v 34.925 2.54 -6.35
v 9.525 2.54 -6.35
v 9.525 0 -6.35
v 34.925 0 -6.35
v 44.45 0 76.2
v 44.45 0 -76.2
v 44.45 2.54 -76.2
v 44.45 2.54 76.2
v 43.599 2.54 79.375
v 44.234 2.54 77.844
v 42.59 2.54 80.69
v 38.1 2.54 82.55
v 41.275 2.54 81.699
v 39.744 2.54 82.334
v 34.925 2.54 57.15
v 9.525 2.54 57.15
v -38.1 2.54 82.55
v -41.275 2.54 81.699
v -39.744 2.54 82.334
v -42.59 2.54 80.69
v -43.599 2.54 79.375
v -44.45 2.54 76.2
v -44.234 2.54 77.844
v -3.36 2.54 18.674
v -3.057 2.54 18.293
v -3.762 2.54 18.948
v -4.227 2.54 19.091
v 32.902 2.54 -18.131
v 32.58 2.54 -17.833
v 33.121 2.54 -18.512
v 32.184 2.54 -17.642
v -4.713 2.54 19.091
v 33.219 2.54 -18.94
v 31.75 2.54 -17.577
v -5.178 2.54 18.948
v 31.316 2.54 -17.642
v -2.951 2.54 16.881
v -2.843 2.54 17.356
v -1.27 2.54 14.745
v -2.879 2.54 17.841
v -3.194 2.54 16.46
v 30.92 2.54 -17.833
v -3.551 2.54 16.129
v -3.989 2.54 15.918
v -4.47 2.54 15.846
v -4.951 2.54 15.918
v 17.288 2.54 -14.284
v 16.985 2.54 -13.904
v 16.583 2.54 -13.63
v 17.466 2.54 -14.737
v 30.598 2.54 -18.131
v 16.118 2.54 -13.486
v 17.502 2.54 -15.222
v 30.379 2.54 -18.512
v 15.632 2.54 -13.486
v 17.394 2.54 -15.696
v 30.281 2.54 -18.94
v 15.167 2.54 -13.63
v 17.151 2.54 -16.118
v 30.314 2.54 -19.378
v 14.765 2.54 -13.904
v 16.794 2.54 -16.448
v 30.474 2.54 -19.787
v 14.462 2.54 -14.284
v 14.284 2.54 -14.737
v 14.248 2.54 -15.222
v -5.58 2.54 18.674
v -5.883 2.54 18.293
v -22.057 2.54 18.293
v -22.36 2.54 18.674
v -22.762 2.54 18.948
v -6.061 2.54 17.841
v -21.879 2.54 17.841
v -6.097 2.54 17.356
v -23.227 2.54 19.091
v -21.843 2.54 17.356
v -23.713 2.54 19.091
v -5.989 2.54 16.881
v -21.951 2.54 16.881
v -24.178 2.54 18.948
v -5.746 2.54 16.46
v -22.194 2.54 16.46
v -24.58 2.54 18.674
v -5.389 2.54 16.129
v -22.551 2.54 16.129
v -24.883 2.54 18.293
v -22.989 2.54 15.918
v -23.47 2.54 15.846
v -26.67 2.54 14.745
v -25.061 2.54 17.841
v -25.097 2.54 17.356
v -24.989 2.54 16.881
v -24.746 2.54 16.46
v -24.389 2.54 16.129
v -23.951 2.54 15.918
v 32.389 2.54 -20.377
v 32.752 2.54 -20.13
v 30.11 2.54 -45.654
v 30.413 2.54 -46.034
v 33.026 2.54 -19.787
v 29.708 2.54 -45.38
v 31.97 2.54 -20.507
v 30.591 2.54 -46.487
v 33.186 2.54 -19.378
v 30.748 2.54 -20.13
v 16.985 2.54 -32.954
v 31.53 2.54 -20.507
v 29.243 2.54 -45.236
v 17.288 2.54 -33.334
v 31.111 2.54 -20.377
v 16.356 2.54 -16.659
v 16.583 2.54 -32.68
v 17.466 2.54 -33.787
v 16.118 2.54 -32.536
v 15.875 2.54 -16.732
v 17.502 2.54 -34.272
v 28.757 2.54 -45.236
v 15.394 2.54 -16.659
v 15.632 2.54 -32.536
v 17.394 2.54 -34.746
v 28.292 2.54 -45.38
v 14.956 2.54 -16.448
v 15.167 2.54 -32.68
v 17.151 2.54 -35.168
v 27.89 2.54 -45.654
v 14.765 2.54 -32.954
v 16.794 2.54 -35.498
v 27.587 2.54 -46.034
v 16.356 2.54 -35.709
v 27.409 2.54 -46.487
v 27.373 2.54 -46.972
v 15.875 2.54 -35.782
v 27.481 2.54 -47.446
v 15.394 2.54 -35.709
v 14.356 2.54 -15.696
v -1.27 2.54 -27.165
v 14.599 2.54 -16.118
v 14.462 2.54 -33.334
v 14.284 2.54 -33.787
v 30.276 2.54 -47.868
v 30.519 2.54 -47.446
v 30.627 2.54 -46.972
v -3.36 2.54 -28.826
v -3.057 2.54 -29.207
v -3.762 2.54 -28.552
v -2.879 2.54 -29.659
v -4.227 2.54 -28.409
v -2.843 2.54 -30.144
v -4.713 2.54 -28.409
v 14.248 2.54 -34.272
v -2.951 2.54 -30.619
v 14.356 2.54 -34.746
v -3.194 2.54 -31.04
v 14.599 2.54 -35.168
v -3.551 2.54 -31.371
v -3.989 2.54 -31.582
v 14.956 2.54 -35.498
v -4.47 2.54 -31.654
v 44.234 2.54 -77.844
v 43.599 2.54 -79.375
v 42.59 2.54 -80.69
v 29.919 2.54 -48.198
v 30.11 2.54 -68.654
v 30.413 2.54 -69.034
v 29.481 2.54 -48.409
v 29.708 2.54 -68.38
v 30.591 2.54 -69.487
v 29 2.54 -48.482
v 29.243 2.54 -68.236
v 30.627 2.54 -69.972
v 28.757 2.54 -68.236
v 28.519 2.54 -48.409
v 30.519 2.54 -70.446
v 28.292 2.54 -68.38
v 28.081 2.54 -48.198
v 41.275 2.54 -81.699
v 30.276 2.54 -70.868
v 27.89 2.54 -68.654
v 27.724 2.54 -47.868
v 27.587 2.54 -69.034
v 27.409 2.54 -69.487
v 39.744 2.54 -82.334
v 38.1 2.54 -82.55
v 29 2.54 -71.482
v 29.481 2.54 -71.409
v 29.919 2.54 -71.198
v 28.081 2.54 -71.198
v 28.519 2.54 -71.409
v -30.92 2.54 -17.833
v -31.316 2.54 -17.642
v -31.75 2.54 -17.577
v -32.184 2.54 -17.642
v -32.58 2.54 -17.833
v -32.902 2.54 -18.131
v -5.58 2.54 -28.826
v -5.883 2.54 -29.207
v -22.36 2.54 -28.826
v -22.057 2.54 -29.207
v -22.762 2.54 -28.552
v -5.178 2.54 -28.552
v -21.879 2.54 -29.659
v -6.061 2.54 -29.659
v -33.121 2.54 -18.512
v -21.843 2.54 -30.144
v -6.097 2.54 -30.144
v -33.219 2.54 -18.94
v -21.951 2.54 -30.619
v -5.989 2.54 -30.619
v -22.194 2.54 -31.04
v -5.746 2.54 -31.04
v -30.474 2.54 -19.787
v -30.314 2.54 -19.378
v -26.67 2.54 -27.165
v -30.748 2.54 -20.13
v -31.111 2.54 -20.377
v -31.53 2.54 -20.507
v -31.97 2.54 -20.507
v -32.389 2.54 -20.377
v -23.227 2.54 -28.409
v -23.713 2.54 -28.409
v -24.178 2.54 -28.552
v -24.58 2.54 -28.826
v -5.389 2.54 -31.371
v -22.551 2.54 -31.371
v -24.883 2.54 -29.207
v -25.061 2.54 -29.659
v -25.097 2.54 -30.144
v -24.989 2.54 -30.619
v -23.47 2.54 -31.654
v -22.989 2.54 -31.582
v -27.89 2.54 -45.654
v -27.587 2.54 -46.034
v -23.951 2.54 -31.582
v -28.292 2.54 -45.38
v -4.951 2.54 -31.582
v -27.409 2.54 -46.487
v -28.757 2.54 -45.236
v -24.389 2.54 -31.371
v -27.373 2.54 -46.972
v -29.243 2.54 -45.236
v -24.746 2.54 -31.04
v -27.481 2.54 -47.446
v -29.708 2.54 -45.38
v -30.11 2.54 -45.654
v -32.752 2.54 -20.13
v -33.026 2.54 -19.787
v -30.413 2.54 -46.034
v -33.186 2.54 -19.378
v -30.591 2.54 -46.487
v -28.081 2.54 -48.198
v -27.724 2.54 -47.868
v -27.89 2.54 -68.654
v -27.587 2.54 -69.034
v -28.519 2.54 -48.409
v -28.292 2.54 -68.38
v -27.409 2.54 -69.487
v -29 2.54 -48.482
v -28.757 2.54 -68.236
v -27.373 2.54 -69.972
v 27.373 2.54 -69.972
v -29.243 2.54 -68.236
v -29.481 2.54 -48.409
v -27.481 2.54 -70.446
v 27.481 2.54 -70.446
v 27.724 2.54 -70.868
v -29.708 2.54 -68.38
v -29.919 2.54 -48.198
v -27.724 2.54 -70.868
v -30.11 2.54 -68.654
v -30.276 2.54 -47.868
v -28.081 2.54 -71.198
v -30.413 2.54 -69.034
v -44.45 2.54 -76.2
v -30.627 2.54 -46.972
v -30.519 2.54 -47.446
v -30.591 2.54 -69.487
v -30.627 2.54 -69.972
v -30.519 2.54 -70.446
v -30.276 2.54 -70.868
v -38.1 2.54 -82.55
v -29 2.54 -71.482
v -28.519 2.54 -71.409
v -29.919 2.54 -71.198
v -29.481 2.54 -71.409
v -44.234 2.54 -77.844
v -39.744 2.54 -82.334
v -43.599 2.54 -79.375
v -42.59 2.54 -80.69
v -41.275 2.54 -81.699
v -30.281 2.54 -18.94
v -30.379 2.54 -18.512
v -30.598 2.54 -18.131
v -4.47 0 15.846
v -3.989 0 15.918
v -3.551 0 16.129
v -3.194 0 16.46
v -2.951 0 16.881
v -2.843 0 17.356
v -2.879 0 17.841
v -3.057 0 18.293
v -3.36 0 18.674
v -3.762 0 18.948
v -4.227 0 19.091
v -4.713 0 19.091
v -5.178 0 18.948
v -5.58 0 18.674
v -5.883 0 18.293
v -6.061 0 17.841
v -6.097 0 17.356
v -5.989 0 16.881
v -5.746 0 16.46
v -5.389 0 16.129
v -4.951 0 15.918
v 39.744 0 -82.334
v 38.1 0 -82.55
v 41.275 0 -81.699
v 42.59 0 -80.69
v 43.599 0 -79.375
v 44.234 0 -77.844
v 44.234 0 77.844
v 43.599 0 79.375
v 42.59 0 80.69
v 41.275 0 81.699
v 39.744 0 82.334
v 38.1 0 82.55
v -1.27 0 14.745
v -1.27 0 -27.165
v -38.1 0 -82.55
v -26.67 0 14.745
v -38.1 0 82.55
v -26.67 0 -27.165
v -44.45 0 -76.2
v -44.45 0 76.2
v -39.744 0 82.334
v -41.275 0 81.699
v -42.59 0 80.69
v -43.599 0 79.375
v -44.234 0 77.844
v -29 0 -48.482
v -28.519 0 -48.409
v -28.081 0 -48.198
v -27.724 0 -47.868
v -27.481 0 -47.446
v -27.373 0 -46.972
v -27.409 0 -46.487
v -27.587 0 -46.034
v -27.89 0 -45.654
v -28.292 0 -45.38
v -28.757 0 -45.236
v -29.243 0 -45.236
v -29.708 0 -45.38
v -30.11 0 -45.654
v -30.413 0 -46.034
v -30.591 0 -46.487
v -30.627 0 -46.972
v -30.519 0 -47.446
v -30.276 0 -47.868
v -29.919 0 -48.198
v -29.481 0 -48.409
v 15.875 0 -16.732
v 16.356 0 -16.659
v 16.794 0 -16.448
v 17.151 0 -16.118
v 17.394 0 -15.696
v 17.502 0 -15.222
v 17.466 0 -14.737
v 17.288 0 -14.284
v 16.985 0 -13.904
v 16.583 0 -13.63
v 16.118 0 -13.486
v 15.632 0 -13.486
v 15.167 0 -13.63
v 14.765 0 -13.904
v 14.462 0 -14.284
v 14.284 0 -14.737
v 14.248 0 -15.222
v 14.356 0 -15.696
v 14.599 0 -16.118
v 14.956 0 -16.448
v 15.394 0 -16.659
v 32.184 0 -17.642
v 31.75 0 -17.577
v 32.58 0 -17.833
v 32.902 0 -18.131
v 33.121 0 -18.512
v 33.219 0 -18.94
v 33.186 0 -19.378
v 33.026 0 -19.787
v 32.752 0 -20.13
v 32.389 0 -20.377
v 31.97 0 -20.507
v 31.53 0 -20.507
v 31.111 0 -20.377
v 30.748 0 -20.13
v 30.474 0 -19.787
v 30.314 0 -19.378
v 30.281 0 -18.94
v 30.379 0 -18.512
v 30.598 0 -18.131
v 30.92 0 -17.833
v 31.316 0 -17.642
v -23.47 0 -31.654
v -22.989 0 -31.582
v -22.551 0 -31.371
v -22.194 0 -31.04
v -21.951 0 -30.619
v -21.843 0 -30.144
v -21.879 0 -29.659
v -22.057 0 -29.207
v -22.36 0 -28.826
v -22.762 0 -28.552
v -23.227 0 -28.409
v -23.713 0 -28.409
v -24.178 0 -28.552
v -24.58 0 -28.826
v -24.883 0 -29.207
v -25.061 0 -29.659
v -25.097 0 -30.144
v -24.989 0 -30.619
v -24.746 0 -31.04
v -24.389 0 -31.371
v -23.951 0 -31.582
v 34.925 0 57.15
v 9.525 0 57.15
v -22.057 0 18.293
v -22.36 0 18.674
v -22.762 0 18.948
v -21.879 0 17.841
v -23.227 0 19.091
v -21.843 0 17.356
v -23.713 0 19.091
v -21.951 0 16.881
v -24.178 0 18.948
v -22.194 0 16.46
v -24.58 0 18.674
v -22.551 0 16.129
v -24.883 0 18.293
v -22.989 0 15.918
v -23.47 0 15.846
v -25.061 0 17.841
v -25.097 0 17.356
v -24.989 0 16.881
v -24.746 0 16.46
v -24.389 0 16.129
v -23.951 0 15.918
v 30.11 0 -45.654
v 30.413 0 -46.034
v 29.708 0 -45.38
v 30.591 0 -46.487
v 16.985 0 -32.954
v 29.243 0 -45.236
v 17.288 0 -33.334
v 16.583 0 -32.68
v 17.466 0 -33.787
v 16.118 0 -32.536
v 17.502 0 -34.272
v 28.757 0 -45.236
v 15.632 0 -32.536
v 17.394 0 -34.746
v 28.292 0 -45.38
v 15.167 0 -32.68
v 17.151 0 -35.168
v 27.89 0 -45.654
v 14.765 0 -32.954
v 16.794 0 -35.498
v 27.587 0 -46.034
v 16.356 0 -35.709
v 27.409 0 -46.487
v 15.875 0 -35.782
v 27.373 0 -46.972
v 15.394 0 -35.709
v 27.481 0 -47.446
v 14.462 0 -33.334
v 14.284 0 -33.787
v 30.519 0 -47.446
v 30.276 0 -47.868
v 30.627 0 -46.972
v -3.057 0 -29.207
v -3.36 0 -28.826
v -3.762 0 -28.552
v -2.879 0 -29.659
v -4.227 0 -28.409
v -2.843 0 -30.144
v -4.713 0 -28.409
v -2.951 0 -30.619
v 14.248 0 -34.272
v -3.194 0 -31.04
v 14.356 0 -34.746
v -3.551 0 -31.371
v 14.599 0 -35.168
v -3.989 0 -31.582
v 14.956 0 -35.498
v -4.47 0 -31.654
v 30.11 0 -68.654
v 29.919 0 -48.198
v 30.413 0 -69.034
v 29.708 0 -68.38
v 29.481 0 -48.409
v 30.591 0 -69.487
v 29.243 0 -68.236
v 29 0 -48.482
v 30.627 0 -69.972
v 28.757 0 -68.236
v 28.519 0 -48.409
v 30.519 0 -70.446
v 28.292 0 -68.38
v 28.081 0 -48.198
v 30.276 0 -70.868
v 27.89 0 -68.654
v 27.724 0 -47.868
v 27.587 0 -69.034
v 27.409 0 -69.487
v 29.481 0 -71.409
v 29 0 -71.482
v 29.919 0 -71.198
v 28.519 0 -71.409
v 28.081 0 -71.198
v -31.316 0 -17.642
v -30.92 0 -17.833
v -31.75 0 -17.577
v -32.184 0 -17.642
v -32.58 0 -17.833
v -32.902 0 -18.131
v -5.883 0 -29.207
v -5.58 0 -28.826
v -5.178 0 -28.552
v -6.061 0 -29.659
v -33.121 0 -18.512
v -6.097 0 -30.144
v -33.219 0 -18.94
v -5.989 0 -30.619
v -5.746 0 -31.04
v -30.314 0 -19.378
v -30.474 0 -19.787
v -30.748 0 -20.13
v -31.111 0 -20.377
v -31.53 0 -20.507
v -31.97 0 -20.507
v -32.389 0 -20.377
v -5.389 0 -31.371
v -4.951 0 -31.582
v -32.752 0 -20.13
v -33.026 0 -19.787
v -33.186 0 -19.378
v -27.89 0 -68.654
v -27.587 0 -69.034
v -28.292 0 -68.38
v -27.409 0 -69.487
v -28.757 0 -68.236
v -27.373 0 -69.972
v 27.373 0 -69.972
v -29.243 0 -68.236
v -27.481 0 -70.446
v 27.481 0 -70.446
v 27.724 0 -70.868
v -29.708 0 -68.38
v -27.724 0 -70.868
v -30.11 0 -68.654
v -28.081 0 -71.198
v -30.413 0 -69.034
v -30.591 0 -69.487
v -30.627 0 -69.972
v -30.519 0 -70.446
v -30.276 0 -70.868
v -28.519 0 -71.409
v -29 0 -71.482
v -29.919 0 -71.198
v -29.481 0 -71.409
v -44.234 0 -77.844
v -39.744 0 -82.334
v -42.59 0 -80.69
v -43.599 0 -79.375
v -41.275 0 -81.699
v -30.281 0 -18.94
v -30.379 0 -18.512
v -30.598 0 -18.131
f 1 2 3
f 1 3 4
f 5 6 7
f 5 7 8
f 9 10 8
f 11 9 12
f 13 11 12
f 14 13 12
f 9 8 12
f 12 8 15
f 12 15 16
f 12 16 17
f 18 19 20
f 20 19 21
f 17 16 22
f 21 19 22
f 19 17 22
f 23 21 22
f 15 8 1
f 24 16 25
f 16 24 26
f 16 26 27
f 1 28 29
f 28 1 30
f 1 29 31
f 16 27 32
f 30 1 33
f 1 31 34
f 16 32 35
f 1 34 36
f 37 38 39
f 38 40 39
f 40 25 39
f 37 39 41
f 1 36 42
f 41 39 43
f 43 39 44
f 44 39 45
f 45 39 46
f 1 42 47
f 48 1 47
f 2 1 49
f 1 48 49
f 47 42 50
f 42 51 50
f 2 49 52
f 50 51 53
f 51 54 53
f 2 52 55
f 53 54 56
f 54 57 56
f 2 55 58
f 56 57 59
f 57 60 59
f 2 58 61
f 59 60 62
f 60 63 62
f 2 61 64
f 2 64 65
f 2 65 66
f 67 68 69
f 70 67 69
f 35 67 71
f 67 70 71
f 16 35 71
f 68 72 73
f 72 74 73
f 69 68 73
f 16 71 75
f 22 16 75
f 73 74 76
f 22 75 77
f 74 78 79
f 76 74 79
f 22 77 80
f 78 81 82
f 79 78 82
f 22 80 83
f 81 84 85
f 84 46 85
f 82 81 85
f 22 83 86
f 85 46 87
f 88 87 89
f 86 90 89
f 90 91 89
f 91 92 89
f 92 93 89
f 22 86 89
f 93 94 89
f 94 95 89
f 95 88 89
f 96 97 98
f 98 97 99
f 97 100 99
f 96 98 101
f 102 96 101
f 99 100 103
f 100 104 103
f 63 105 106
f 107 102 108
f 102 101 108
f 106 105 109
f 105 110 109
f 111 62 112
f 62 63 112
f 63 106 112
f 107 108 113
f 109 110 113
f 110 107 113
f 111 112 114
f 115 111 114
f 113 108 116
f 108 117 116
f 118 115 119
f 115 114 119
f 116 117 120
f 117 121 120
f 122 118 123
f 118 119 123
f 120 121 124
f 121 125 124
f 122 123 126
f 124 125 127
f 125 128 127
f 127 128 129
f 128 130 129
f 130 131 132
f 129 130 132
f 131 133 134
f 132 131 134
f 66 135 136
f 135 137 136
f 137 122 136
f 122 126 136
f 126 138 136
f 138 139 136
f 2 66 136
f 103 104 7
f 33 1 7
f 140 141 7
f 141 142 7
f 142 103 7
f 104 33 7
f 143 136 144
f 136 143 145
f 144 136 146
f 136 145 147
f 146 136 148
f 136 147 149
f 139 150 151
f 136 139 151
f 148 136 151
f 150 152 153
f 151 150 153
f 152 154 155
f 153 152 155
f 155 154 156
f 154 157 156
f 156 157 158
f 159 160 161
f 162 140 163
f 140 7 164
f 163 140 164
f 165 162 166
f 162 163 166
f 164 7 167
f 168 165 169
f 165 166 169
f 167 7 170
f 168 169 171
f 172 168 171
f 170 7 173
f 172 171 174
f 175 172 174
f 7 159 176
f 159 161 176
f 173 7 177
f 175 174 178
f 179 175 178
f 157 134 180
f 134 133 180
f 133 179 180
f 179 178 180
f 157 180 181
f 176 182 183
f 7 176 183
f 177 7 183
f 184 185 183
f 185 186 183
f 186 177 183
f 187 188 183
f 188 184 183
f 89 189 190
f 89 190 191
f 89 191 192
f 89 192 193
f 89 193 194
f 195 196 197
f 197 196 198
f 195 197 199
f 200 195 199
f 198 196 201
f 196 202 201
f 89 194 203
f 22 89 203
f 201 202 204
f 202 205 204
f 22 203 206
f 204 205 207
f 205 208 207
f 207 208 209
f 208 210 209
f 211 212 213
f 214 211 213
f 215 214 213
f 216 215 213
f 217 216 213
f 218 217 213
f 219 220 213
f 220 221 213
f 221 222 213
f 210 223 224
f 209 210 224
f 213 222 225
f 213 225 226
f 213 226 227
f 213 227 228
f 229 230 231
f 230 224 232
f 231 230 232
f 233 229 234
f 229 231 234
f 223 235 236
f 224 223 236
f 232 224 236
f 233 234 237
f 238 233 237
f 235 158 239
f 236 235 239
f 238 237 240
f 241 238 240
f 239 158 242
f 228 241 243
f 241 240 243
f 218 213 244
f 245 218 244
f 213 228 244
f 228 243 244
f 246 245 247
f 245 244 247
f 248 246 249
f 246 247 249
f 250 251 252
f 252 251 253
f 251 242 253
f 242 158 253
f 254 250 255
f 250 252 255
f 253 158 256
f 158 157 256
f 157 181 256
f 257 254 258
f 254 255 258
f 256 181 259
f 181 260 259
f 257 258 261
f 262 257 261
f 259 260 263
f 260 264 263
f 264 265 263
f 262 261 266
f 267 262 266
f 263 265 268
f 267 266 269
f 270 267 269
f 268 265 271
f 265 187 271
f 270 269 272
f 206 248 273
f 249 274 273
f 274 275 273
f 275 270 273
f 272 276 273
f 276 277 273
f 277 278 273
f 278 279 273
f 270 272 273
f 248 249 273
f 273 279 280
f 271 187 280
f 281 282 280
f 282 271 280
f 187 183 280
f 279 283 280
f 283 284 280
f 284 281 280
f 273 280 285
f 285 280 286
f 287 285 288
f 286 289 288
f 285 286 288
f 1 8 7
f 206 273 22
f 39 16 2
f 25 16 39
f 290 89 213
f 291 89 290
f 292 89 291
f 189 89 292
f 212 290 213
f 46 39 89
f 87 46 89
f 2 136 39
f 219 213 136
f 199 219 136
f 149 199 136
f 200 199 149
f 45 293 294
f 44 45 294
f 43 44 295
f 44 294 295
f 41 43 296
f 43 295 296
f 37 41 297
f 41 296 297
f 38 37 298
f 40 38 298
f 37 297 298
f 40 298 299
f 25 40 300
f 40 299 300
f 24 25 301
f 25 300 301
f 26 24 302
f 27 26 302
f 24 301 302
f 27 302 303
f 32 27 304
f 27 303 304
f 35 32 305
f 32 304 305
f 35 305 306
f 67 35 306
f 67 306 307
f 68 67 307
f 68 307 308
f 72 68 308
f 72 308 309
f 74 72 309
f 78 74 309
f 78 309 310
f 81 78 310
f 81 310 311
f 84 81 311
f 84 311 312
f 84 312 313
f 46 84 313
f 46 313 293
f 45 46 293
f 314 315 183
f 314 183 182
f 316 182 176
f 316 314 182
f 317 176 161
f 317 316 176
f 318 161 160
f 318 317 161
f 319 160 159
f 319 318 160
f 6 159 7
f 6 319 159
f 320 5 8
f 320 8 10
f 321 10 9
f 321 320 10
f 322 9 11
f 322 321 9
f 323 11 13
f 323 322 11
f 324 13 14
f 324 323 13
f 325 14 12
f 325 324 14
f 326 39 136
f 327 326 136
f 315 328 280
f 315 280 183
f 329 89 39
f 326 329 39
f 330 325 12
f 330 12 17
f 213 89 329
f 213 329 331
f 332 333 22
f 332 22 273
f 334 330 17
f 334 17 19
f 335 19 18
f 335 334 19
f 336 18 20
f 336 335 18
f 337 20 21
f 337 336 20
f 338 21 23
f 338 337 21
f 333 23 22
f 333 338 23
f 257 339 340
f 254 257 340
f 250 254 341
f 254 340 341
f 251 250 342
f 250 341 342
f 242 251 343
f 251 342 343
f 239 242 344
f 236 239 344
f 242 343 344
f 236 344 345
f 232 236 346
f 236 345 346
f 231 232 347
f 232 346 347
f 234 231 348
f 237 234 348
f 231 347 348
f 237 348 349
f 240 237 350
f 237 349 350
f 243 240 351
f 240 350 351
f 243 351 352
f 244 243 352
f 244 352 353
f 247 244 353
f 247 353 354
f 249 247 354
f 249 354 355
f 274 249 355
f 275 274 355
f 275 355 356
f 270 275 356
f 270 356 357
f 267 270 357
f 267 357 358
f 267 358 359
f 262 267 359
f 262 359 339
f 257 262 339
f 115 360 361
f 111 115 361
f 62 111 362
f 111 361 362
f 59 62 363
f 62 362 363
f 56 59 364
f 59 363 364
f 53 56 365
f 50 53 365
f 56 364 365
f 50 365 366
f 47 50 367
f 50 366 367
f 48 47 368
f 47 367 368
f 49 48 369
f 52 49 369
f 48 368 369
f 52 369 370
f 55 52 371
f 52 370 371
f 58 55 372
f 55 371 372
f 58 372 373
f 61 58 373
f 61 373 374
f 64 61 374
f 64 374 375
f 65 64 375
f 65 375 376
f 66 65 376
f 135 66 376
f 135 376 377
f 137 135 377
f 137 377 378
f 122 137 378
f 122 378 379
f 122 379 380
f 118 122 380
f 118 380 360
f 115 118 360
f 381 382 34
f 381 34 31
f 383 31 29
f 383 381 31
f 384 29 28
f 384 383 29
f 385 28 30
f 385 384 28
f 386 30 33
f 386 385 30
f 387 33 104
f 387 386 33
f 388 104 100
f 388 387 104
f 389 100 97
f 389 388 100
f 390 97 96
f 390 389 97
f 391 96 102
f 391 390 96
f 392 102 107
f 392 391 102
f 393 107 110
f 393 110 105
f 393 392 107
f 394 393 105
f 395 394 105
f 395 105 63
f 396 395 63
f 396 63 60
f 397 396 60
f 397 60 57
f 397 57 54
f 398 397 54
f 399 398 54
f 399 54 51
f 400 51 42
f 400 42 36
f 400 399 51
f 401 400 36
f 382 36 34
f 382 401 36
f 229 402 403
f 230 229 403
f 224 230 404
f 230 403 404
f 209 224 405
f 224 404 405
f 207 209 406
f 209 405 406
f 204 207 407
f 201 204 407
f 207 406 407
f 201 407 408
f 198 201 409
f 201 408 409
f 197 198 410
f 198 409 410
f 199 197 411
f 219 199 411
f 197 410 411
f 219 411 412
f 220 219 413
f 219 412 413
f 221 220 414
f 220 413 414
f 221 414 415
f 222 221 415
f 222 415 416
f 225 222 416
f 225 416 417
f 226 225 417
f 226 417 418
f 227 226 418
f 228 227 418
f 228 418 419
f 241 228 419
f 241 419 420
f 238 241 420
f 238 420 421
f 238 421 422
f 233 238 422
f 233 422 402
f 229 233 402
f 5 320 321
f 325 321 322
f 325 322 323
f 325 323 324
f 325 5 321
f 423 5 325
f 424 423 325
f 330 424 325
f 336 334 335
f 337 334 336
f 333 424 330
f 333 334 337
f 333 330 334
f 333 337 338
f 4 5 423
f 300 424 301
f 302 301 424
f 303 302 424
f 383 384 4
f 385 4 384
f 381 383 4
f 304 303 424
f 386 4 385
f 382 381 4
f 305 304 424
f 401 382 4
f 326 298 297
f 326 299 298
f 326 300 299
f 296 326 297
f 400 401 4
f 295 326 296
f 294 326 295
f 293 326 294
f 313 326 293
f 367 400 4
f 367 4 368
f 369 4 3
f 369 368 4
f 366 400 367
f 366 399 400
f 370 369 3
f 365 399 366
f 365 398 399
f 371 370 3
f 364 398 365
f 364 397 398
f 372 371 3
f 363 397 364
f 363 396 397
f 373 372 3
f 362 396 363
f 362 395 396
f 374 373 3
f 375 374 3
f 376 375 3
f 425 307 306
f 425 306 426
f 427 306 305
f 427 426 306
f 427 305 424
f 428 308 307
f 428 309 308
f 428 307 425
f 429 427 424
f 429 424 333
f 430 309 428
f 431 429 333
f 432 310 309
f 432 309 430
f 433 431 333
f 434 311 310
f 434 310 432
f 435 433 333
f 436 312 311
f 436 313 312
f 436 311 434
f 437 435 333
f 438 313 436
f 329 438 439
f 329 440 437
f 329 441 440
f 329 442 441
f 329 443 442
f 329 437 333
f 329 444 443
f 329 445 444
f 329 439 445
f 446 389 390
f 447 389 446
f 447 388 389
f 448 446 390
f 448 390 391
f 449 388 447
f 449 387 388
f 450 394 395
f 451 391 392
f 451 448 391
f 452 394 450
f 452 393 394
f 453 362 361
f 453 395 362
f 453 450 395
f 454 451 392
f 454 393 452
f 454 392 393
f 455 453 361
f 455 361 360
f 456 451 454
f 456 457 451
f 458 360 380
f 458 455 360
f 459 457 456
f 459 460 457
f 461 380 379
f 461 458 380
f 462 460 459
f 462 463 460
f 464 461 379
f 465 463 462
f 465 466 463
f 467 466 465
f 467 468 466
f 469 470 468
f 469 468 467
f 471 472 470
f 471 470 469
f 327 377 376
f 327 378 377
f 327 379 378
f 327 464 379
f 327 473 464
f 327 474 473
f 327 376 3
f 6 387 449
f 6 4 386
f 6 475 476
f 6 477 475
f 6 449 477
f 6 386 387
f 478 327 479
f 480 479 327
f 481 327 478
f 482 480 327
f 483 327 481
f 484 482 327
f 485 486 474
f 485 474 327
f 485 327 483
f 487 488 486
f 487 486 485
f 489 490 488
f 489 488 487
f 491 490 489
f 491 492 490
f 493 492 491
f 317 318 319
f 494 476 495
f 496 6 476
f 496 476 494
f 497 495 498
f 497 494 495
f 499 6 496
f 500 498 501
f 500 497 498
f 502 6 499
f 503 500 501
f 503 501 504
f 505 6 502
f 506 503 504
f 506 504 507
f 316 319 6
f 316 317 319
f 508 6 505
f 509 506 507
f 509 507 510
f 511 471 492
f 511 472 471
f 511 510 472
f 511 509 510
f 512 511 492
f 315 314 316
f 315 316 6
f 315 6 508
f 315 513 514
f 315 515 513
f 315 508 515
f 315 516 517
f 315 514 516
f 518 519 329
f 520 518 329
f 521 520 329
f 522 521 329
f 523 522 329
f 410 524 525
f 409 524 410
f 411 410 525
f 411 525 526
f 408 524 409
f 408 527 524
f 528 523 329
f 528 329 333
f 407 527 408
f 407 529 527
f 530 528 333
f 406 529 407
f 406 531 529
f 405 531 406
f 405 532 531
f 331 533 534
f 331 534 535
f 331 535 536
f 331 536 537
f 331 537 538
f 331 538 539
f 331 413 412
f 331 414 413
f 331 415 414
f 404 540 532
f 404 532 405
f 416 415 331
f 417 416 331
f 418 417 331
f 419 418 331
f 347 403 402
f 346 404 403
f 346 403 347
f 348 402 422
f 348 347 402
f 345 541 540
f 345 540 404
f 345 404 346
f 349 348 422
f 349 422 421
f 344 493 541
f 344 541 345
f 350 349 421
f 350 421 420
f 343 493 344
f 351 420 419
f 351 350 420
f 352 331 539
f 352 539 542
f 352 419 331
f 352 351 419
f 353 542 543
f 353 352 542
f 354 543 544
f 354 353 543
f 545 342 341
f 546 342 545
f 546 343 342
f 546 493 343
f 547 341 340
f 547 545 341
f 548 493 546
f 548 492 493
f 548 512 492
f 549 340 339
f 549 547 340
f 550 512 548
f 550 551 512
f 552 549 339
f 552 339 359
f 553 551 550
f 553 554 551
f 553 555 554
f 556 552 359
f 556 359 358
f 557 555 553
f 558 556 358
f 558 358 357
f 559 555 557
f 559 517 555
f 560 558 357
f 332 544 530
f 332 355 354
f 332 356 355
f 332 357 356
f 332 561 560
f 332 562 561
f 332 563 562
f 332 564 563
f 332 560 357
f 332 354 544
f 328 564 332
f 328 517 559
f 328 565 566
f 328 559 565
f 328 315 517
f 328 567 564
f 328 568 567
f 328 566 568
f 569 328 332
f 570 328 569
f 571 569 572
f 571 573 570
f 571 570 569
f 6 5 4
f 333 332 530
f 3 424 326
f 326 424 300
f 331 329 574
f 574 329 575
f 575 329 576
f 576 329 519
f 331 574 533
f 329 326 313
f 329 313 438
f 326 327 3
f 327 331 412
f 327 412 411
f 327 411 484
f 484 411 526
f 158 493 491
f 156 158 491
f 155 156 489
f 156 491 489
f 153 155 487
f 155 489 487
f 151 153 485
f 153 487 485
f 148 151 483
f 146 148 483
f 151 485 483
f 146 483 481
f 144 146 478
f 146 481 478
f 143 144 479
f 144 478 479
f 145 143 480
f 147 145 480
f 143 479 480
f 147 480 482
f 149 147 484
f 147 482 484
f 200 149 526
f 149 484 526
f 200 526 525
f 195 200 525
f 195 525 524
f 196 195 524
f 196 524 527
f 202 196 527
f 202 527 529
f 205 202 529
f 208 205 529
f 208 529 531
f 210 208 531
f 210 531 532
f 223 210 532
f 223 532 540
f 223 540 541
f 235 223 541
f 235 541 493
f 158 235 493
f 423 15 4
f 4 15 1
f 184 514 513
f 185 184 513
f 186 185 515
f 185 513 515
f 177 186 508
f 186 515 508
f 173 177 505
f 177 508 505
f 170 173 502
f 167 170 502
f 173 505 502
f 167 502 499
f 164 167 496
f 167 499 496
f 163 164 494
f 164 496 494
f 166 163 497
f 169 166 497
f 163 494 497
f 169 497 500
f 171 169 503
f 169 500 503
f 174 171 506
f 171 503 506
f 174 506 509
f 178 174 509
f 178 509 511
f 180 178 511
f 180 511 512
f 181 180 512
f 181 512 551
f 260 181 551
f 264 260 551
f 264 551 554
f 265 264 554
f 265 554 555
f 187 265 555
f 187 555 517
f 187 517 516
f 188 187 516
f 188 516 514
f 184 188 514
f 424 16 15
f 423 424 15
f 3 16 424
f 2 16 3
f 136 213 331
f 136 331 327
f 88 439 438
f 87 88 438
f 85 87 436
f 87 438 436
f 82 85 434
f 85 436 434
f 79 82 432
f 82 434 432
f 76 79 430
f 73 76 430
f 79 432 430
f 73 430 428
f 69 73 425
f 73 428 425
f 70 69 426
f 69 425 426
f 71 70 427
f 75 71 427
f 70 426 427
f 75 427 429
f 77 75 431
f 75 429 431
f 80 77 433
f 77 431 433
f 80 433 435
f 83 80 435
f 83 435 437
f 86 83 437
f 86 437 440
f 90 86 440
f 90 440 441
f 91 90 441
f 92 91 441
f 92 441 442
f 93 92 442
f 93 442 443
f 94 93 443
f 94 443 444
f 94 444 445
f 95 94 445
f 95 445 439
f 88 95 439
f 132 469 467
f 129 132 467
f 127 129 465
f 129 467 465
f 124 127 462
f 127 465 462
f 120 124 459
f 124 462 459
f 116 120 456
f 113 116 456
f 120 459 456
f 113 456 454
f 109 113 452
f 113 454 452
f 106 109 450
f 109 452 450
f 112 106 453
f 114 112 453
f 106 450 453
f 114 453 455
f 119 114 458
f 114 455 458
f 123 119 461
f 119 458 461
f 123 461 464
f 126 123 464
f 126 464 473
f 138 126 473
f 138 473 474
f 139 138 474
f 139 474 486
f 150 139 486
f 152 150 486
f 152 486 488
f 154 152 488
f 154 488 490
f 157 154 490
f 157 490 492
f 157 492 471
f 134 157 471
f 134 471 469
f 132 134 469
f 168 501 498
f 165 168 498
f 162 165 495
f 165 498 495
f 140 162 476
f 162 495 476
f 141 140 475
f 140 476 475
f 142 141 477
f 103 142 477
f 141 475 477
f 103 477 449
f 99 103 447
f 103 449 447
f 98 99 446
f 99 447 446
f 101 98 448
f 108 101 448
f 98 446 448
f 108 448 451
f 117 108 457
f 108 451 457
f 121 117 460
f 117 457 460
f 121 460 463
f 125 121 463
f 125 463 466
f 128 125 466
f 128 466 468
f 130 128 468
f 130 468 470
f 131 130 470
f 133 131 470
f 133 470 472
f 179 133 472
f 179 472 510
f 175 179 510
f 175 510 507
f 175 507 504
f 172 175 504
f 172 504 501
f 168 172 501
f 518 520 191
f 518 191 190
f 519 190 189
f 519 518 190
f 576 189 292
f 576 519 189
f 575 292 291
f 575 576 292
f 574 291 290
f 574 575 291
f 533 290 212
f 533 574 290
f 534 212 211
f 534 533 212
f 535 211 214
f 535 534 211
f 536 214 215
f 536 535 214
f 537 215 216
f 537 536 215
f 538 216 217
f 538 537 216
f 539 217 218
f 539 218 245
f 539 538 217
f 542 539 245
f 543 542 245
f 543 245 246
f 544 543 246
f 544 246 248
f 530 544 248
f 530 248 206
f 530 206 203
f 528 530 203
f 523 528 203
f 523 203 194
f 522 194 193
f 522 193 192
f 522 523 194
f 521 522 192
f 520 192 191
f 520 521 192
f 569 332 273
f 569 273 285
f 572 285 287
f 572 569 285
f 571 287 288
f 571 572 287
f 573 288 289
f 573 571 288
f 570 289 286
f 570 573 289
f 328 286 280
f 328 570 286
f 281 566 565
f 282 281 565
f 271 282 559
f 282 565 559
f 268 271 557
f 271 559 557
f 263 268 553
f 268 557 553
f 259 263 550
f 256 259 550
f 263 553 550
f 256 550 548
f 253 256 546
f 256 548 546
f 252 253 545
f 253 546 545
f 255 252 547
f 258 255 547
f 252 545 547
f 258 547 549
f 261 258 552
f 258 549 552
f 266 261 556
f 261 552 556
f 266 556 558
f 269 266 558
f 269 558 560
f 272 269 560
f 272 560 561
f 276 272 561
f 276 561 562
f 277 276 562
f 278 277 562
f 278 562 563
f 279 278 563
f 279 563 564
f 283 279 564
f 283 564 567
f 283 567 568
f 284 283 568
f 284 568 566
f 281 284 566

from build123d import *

# Parameters (mm, degrees)
SKETCH1_R             = 1.4732
BOSS_EXTRUDE1_DEPTH   = 2.54
F_4_CLEARANCE_HOLE1_D = 3.2639
CUT_EXTRUDE1_REACH    = 95.791
SKETCH4_W             = 25.4
SKETCH4_H             = 63.5
SKETCH4_H_2           = 41.91


with BuildPart() as part:
    # Sketch1 → Boss-Extrude1 (new body)
    with BuildSketch(Plane(origin=(0, 0, 0), x_dir=(1, 0, 0), z_dir=(0, 1, 0))):
        with BuildLine():
            ThreePointArc((-44.45, 76.2), (-42.590128061, 80.690128061), (-38.1, 82.55))
            Line((-38.1, 82.55), (38.1, 82.55))
            ThreePointArc((38.1, 82.55), (42.590128061, 80.690128061), (44.45, 76.2))
            Line((44.45, 76.2), (44.45, -76.2))
            ThreePointArc((44.45, -76.2), (42.590128061, -80.690128061), (38.1, -82.55))
            Line((38.1, -82.55), (-38.1, -82.55))
            ThreePointArc((-38.1, -82.55), (-42.590128061, -80.690128061), (-44.45, -76.2))
            Line((-44.45, -76.2), (-44.45, 76.2))
        make_face()
        with Locations(Location((31.75, 19.05, 0), (0, 0, 270))):
            Circle(SKETCH1_R, mode=Mode.SUBTRACT)
        with Locations(Location((-31.75, 19.05, 0), (0, 0, 270))):
            Circle(SKETCH1_R, mode=Mode.SUBTRACT)
    extrude(amount=BOSS_EXTRUDE1_DEPTH)

    # #4 Clearance Hole1 (through all)
    with Locations(Plane(origin=(-29, 2.54, -69.85), x_dir=(0, 0, 1), z_dir=(0, 1, 0))):
        with Locations((0, 0), (0, 58), (23, 58), (23, 0), (39.8275, 5.53), (39.8275, 24.53), (87.3275, 24.53), (87.3275, 5.53), (35.7, 44.875), (54.75, 44.875)):
            Hole(F_4_CLEARANCE_HOLE1_D / 2)

    # Sketch4 → Cut-Extrude1 (cut, up to next)
    with BuildSketch(Plane(origin=(0, 2.54, 0), x_dir=(1, 0, 0), z_dir=(0, 1, 0)), mode=Mode.PRIVATE) as cut_extrude1_sk1:
        with Locations((22.225, -25.4)):
            Rectangle(SKETCH4_W, SKETCH4_H)
    cut_extrude1_tool1 = extrude(cut_extrude1_sk1.sketch, amount=-CUT_EXTRUDE1_REACH, mode=Mode.PRIVATE) & part.part
    # Sketch4 → Cut-Extrude1 (cut, up to next)
    with BuildSketch(Plane(origin=(0, 2.54, 0), x_dir=(1, 0, 0), z_dir=(0, 1, 0)), mode=Mode.PRIVATE) as cut_extrude1_sk2:
        with Locations((-13.97, 6.21)):
            Rectangle(SKETCH4_W, SKETCH4_H_2)
    cut_extrude1_tool2 = extrude(cut_extrude1_sk2.sketch, amount=-CUT_EXTRUDE1_REACH, mode=Mode.PRIVATE) & part.part
    add(cut_extrude1_tool1.solids().sort_by_distance((22.225, 2.54, 25.4))[0], mode=Mode.SUBTRACT)
    add(cut_extrude1_tool2.solids().sort_by_distance((-13.97, 2.54, -6.21))[0], mode=Mode.SUBTRACT)


solid = part.part
